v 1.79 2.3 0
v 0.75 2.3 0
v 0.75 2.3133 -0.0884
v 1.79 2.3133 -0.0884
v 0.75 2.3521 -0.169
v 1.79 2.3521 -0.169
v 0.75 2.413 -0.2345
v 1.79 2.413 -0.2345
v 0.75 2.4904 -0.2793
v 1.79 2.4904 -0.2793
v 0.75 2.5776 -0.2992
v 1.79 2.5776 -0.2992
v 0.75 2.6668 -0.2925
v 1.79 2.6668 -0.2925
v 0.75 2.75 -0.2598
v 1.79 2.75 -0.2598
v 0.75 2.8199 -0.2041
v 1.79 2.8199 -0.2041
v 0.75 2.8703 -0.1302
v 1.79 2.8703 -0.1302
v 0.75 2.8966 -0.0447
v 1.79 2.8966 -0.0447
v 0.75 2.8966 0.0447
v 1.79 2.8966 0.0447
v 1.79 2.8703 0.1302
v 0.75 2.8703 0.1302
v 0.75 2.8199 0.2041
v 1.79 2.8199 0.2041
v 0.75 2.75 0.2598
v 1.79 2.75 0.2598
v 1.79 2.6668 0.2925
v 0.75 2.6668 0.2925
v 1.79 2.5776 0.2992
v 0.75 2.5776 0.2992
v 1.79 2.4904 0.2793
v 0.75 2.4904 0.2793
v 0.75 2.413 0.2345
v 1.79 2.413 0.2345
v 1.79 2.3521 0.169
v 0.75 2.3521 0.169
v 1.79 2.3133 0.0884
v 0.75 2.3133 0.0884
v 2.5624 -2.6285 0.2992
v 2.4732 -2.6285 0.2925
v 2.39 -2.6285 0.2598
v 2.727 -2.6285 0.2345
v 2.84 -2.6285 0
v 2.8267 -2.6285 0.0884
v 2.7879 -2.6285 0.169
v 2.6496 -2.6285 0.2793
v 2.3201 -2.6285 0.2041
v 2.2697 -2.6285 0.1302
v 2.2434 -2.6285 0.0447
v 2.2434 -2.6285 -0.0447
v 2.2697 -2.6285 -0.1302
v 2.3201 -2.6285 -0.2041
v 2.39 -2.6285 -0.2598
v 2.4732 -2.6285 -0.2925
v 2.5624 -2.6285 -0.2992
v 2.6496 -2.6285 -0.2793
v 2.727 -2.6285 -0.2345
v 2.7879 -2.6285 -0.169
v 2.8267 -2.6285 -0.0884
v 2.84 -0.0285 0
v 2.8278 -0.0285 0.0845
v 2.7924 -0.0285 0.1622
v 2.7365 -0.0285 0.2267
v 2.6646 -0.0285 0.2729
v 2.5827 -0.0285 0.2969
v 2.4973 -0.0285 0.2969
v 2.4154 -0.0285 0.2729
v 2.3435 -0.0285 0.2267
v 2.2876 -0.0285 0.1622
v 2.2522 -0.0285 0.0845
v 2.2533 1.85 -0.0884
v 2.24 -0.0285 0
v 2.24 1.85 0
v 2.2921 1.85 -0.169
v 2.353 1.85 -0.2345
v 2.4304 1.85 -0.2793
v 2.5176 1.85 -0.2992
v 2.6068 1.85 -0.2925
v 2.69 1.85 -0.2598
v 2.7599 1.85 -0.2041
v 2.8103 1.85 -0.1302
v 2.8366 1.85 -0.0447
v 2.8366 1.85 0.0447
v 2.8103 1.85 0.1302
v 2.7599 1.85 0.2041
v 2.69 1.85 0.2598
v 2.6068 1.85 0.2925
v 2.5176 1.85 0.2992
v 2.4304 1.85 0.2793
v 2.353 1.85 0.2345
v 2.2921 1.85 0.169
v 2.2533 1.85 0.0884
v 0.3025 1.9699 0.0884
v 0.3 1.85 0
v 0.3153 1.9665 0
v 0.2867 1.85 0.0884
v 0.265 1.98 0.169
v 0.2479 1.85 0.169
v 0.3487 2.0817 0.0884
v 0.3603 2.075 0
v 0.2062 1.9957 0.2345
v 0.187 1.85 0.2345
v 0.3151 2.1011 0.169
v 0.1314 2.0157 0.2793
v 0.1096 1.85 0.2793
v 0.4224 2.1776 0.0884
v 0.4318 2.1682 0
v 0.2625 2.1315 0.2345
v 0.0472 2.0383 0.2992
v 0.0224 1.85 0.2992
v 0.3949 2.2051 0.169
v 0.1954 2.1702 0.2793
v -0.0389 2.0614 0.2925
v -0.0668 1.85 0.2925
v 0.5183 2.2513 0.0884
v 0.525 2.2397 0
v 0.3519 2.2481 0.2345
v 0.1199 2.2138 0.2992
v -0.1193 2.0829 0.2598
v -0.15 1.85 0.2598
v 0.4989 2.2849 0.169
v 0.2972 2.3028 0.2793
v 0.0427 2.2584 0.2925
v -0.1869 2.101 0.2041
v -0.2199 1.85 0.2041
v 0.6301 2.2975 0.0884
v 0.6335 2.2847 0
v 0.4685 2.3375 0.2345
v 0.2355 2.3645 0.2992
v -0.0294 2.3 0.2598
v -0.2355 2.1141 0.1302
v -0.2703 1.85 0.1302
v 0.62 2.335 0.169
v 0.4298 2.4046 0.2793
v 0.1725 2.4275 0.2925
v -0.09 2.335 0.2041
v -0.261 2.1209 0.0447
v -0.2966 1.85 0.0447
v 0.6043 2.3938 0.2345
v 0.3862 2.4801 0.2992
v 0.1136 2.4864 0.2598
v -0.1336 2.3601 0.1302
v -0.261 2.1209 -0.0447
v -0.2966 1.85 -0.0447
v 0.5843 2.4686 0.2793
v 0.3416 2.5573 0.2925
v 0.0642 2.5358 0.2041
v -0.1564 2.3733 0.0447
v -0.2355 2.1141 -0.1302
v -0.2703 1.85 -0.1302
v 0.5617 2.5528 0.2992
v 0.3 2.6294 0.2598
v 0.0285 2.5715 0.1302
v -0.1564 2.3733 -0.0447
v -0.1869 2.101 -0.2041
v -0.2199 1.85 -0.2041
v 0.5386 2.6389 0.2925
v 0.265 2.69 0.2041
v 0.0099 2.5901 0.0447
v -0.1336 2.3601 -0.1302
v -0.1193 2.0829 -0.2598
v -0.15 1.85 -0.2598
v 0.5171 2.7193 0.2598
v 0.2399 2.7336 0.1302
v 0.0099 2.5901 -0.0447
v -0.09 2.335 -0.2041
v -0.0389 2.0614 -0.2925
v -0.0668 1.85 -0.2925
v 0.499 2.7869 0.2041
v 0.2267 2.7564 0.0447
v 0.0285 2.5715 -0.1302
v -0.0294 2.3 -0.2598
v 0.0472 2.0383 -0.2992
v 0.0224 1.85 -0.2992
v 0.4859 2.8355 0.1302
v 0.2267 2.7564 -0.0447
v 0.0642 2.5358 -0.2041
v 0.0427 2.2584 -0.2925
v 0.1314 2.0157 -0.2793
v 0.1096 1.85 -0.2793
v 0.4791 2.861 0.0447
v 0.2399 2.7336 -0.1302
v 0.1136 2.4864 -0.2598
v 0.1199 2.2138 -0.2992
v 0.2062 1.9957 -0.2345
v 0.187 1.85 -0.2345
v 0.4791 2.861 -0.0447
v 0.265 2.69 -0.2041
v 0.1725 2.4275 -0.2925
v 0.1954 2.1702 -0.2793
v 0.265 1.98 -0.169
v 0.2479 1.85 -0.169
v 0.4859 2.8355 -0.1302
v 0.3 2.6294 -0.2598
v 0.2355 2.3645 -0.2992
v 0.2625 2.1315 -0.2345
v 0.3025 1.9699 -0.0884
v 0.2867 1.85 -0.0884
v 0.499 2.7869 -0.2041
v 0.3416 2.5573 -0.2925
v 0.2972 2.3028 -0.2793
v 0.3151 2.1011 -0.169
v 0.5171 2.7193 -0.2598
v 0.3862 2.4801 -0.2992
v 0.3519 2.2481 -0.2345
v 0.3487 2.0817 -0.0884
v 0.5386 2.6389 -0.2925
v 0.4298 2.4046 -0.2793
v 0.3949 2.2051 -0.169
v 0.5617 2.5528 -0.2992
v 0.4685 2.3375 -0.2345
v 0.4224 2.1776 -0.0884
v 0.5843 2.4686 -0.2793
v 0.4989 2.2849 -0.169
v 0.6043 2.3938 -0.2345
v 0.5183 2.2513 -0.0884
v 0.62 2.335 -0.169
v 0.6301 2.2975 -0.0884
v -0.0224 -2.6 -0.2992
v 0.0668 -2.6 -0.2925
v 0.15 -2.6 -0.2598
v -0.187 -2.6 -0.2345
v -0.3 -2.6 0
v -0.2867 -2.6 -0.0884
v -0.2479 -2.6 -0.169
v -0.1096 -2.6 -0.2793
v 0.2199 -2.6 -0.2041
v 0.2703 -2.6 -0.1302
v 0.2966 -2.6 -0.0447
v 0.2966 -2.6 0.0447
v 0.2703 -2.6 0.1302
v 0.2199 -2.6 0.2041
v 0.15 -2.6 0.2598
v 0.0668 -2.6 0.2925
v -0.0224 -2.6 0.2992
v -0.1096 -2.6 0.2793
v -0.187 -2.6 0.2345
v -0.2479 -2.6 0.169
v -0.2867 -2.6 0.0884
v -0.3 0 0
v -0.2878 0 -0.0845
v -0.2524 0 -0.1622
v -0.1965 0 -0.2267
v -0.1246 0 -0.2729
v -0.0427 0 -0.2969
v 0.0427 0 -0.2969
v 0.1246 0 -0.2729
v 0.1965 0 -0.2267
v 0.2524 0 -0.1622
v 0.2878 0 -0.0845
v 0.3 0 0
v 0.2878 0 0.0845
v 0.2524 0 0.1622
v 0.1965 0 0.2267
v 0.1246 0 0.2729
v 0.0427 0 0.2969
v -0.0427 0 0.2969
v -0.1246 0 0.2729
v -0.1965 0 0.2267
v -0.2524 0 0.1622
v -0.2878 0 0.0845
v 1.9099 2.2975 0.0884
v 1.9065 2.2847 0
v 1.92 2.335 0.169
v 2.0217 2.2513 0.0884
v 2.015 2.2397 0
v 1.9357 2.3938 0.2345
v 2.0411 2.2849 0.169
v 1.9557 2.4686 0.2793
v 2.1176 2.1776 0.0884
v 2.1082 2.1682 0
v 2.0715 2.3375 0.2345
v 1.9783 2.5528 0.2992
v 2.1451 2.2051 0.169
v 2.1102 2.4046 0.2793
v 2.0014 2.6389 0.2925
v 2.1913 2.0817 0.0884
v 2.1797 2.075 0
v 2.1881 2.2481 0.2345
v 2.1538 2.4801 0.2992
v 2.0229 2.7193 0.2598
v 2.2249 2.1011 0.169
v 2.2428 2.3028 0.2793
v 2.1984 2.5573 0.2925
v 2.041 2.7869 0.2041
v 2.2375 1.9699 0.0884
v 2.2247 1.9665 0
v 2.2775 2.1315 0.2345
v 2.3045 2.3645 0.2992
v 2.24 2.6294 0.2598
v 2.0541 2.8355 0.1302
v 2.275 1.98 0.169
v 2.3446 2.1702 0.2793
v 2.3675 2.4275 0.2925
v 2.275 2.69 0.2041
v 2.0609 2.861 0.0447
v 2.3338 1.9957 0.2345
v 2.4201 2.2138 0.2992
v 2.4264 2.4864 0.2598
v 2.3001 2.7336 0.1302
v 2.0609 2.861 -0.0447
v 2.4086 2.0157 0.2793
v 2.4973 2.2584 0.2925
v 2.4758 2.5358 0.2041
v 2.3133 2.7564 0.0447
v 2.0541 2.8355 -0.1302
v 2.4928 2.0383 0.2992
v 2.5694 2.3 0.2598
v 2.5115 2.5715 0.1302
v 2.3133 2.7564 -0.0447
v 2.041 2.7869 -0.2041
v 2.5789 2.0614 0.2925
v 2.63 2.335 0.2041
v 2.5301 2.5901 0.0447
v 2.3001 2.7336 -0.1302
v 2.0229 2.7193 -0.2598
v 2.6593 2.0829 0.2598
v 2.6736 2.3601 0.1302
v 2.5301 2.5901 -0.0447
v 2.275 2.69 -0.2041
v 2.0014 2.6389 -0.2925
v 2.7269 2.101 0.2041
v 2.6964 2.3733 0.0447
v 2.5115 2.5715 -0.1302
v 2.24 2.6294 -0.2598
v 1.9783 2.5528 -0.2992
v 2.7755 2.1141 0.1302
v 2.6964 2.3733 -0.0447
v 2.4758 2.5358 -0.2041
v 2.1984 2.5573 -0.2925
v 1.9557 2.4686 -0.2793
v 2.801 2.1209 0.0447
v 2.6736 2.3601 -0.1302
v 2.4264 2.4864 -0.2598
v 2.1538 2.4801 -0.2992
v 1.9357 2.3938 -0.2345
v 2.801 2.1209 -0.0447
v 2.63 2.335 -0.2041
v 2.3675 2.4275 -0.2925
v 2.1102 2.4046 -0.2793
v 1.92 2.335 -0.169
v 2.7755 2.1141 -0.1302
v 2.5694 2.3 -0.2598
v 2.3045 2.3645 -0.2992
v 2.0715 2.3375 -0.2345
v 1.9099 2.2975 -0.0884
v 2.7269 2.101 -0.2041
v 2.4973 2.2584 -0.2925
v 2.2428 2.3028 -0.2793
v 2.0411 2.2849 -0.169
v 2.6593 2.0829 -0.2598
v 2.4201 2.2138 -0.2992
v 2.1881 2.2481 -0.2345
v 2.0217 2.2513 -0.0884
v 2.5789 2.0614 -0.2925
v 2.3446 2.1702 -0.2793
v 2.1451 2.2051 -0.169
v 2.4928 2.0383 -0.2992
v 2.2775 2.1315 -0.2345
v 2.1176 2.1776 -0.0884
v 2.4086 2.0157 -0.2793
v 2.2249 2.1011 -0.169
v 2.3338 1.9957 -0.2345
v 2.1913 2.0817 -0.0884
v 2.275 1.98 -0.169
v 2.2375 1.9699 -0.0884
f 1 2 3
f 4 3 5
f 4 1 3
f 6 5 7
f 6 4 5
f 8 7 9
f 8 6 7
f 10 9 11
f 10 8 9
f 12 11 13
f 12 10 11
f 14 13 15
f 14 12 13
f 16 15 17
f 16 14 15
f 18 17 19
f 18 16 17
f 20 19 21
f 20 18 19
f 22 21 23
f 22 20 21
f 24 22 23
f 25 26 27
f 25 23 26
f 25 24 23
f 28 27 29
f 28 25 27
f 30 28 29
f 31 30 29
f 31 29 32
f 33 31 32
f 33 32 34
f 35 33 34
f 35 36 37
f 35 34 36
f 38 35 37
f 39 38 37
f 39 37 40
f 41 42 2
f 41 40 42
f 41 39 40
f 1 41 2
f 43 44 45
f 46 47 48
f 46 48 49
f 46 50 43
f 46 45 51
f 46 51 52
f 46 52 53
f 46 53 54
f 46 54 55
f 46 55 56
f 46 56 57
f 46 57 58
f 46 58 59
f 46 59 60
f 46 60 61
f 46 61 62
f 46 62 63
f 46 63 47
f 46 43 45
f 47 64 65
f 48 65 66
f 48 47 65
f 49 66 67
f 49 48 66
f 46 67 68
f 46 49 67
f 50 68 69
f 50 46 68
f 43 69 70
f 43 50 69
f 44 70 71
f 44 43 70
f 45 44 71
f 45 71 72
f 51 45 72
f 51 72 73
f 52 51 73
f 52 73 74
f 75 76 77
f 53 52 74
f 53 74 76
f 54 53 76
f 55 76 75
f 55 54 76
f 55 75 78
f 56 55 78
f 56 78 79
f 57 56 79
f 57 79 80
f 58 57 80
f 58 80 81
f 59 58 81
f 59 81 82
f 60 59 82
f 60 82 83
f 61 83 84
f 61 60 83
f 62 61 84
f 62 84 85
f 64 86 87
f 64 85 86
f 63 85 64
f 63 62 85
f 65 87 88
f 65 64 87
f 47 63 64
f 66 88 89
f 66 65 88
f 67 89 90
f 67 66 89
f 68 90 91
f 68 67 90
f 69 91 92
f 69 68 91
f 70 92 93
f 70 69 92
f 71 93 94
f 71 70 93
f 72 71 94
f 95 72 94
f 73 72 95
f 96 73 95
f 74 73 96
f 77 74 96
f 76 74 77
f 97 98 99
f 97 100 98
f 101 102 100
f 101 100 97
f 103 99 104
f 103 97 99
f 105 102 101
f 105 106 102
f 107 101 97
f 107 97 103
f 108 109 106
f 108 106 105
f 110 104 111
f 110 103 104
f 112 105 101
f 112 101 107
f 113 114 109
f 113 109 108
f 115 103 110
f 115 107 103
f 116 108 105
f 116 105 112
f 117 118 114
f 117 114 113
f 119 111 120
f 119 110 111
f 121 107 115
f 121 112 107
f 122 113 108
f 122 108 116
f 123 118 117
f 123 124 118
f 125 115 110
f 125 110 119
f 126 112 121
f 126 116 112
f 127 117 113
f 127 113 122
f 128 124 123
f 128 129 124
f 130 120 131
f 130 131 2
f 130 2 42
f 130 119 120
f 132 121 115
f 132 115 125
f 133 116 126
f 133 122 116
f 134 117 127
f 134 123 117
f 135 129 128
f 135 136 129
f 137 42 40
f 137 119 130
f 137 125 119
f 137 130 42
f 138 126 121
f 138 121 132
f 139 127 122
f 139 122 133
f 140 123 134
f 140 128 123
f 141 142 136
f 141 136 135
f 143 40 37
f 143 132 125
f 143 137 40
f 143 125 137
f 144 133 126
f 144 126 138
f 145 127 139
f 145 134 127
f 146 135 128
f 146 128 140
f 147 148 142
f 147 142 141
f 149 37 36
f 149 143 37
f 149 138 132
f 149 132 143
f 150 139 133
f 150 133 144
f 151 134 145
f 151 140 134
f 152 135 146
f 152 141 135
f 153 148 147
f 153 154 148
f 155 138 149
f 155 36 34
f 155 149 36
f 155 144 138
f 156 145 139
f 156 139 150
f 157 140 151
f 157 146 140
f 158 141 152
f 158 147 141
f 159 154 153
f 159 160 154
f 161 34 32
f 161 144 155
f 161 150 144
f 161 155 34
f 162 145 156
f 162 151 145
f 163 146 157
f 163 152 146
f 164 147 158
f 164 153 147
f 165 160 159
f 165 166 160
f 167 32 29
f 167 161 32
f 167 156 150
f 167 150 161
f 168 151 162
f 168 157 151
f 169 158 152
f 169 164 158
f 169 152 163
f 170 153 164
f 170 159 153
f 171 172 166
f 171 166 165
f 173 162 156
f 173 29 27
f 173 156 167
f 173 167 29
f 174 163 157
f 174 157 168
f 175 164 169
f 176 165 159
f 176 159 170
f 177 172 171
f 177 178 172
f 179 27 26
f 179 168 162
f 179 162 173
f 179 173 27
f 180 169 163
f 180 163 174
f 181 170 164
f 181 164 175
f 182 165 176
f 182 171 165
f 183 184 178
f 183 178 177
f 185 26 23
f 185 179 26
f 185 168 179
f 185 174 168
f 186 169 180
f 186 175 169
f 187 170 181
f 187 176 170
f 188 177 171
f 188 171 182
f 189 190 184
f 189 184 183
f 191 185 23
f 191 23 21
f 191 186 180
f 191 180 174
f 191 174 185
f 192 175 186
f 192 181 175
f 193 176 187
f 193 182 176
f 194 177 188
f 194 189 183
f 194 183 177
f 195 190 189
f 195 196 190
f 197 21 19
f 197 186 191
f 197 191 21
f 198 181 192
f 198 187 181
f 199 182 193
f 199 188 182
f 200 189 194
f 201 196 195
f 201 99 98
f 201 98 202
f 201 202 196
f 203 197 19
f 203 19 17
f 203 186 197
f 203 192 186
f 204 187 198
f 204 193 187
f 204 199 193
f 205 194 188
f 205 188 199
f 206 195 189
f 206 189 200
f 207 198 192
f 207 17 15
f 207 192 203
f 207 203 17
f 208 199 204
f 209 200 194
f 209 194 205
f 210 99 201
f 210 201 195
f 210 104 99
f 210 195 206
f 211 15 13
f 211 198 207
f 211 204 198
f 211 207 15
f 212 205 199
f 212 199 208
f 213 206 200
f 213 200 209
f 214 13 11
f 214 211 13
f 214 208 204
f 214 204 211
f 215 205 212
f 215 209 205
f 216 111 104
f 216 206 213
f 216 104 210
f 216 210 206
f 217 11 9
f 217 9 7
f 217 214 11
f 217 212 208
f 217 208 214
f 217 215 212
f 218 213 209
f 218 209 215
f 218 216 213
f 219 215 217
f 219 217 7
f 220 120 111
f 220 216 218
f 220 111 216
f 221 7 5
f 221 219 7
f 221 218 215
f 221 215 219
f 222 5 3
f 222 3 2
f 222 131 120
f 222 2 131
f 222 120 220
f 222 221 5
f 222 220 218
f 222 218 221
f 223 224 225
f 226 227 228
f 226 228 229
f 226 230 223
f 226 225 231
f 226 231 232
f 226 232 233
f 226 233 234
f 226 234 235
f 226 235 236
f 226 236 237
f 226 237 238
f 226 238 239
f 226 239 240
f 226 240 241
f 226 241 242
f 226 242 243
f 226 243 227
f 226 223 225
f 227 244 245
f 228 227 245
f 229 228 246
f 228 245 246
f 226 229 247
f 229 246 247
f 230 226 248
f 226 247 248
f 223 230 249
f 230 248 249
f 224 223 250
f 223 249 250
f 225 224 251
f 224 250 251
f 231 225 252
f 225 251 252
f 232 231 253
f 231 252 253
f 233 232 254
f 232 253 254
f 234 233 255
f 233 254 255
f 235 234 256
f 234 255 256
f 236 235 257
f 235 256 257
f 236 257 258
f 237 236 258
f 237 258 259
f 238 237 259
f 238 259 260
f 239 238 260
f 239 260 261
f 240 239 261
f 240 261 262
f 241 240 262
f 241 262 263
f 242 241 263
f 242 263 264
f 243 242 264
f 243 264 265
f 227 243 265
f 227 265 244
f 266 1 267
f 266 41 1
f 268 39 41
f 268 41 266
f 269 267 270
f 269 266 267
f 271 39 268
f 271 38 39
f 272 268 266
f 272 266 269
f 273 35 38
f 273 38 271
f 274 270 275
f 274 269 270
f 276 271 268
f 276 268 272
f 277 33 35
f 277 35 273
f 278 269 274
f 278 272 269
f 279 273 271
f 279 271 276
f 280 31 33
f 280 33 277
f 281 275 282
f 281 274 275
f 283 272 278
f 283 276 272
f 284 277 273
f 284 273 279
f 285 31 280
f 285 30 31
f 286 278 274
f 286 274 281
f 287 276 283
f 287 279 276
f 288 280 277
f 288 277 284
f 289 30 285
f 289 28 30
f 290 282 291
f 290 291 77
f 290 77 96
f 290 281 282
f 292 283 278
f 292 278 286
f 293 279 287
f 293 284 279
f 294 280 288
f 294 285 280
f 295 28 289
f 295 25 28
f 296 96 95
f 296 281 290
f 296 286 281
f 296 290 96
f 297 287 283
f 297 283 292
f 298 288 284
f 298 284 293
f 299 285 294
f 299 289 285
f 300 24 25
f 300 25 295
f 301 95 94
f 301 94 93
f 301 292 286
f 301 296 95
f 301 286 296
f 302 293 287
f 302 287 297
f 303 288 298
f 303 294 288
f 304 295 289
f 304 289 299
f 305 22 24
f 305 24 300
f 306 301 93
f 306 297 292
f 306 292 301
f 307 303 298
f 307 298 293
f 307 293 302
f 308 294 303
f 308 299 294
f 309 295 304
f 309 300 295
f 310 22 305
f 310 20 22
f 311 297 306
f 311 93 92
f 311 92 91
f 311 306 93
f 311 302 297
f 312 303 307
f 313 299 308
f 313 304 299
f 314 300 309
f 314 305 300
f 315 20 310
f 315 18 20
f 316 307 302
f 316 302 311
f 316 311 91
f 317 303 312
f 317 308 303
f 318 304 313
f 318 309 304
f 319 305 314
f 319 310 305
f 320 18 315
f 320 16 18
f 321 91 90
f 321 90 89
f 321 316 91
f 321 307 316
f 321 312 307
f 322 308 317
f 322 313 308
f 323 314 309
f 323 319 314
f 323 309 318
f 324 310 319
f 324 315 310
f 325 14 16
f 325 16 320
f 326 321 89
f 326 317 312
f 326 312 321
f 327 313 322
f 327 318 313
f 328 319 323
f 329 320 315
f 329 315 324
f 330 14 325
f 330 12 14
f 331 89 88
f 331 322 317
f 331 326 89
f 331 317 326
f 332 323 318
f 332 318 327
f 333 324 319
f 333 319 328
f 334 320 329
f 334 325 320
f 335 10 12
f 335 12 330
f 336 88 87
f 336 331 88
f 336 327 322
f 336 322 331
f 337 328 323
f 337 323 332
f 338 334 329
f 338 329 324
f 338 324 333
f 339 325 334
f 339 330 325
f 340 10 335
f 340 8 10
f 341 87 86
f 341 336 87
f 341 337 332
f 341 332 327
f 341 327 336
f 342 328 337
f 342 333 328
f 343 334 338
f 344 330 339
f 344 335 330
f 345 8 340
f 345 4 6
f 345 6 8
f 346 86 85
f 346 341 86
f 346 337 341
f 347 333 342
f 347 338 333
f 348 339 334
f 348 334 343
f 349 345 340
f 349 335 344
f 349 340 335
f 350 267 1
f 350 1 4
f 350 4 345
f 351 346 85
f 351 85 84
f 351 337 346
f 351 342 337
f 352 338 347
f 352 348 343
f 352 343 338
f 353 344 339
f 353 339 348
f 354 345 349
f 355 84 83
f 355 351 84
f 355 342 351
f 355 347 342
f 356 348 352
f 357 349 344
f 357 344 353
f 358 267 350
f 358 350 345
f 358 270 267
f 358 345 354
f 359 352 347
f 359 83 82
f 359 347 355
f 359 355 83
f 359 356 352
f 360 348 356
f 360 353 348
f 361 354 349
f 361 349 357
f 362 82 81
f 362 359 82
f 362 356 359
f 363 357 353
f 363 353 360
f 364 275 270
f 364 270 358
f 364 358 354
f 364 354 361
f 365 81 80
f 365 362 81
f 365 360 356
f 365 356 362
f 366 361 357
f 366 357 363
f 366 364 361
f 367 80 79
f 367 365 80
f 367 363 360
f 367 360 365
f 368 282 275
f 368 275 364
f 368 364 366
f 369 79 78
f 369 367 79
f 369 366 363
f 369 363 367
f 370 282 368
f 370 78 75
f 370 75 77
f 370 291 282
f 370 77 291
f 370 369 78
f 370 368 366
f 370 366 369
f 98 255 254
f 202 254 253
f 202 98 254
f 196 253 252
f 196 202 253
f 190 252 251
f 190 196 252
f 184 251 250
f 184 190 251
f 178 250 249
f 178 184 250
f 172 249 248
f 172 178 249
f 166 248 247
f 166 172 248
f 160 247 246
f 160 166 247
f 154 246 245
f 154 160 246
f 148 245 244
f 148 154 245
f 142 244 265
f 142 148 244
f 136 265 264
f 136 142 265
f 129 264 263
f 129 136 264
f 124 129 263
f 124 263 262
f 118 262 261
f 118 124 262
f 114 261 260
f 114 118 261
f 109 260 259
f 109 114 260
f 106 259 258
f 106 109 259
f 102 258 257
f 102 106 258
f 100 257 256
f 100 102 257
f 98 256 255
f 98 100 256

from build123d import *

# Parameters (mm, degrees)
SKETCH2_R           = 0.3
SKETCH4_R           = 0.3
BOSS_EXTRUDE1_DEPTH = 2.6
BOSS_EXTRUDE2_START = 2.6
SKETCH5_R           = 0.3
BOSS_EXTRUDE2_DEPTH = 2.6


with BuildPart() as part:
    # Sweep1: sweep along a path in Sketch1
    with BuildLine(Plane.XY) as sweep1_path:
        Line((0, 0), (0, 1.85))
        ThreePointArc((0, 1.85), (0.219669914, 2.380330086), (0.75, 2.6))
        Line((0.75, 2.6), (1.79, 2.6))
        ThreePointArc((1.79, 2.6), (2.320330086, 2.380330086), (2.54, 1.85))
        Line((2.54, 1.85), (2.54, -0.028529553))
    # Sketch2 → Sweep1 (sweep)
    with BuildSketch(Plane(origin=(0, 0, 0), x_dir=(1, 0, 0), z_dir=(0, 1, 0))):
        Circle(SKETCH2_R)
    sweep(path=sweep1_path.line)

    # Sketch4 → Boss-Extrude1 (add)
    with BuildSketch(Plane.XZ):
        with Locations(Location((0, 0, 0), (0, 0, 180))):
            Circle(SKETCH4_R)
    extrude(amount=BOSS_EXTRUDE1_DEPTH)

    # Sketch5 → Boss-Extrude2 (add)
    with BuildSketch(Plane.XZ.offset(0.028529553).offset(BOSS_EXTRUDE2_START)):
        with Locations((2.54, 0)):
            Circle(SKETCH5_R)
    extrude(amount=-BOSS_EXTRUDE2_DEPTH)


solid = part.part
